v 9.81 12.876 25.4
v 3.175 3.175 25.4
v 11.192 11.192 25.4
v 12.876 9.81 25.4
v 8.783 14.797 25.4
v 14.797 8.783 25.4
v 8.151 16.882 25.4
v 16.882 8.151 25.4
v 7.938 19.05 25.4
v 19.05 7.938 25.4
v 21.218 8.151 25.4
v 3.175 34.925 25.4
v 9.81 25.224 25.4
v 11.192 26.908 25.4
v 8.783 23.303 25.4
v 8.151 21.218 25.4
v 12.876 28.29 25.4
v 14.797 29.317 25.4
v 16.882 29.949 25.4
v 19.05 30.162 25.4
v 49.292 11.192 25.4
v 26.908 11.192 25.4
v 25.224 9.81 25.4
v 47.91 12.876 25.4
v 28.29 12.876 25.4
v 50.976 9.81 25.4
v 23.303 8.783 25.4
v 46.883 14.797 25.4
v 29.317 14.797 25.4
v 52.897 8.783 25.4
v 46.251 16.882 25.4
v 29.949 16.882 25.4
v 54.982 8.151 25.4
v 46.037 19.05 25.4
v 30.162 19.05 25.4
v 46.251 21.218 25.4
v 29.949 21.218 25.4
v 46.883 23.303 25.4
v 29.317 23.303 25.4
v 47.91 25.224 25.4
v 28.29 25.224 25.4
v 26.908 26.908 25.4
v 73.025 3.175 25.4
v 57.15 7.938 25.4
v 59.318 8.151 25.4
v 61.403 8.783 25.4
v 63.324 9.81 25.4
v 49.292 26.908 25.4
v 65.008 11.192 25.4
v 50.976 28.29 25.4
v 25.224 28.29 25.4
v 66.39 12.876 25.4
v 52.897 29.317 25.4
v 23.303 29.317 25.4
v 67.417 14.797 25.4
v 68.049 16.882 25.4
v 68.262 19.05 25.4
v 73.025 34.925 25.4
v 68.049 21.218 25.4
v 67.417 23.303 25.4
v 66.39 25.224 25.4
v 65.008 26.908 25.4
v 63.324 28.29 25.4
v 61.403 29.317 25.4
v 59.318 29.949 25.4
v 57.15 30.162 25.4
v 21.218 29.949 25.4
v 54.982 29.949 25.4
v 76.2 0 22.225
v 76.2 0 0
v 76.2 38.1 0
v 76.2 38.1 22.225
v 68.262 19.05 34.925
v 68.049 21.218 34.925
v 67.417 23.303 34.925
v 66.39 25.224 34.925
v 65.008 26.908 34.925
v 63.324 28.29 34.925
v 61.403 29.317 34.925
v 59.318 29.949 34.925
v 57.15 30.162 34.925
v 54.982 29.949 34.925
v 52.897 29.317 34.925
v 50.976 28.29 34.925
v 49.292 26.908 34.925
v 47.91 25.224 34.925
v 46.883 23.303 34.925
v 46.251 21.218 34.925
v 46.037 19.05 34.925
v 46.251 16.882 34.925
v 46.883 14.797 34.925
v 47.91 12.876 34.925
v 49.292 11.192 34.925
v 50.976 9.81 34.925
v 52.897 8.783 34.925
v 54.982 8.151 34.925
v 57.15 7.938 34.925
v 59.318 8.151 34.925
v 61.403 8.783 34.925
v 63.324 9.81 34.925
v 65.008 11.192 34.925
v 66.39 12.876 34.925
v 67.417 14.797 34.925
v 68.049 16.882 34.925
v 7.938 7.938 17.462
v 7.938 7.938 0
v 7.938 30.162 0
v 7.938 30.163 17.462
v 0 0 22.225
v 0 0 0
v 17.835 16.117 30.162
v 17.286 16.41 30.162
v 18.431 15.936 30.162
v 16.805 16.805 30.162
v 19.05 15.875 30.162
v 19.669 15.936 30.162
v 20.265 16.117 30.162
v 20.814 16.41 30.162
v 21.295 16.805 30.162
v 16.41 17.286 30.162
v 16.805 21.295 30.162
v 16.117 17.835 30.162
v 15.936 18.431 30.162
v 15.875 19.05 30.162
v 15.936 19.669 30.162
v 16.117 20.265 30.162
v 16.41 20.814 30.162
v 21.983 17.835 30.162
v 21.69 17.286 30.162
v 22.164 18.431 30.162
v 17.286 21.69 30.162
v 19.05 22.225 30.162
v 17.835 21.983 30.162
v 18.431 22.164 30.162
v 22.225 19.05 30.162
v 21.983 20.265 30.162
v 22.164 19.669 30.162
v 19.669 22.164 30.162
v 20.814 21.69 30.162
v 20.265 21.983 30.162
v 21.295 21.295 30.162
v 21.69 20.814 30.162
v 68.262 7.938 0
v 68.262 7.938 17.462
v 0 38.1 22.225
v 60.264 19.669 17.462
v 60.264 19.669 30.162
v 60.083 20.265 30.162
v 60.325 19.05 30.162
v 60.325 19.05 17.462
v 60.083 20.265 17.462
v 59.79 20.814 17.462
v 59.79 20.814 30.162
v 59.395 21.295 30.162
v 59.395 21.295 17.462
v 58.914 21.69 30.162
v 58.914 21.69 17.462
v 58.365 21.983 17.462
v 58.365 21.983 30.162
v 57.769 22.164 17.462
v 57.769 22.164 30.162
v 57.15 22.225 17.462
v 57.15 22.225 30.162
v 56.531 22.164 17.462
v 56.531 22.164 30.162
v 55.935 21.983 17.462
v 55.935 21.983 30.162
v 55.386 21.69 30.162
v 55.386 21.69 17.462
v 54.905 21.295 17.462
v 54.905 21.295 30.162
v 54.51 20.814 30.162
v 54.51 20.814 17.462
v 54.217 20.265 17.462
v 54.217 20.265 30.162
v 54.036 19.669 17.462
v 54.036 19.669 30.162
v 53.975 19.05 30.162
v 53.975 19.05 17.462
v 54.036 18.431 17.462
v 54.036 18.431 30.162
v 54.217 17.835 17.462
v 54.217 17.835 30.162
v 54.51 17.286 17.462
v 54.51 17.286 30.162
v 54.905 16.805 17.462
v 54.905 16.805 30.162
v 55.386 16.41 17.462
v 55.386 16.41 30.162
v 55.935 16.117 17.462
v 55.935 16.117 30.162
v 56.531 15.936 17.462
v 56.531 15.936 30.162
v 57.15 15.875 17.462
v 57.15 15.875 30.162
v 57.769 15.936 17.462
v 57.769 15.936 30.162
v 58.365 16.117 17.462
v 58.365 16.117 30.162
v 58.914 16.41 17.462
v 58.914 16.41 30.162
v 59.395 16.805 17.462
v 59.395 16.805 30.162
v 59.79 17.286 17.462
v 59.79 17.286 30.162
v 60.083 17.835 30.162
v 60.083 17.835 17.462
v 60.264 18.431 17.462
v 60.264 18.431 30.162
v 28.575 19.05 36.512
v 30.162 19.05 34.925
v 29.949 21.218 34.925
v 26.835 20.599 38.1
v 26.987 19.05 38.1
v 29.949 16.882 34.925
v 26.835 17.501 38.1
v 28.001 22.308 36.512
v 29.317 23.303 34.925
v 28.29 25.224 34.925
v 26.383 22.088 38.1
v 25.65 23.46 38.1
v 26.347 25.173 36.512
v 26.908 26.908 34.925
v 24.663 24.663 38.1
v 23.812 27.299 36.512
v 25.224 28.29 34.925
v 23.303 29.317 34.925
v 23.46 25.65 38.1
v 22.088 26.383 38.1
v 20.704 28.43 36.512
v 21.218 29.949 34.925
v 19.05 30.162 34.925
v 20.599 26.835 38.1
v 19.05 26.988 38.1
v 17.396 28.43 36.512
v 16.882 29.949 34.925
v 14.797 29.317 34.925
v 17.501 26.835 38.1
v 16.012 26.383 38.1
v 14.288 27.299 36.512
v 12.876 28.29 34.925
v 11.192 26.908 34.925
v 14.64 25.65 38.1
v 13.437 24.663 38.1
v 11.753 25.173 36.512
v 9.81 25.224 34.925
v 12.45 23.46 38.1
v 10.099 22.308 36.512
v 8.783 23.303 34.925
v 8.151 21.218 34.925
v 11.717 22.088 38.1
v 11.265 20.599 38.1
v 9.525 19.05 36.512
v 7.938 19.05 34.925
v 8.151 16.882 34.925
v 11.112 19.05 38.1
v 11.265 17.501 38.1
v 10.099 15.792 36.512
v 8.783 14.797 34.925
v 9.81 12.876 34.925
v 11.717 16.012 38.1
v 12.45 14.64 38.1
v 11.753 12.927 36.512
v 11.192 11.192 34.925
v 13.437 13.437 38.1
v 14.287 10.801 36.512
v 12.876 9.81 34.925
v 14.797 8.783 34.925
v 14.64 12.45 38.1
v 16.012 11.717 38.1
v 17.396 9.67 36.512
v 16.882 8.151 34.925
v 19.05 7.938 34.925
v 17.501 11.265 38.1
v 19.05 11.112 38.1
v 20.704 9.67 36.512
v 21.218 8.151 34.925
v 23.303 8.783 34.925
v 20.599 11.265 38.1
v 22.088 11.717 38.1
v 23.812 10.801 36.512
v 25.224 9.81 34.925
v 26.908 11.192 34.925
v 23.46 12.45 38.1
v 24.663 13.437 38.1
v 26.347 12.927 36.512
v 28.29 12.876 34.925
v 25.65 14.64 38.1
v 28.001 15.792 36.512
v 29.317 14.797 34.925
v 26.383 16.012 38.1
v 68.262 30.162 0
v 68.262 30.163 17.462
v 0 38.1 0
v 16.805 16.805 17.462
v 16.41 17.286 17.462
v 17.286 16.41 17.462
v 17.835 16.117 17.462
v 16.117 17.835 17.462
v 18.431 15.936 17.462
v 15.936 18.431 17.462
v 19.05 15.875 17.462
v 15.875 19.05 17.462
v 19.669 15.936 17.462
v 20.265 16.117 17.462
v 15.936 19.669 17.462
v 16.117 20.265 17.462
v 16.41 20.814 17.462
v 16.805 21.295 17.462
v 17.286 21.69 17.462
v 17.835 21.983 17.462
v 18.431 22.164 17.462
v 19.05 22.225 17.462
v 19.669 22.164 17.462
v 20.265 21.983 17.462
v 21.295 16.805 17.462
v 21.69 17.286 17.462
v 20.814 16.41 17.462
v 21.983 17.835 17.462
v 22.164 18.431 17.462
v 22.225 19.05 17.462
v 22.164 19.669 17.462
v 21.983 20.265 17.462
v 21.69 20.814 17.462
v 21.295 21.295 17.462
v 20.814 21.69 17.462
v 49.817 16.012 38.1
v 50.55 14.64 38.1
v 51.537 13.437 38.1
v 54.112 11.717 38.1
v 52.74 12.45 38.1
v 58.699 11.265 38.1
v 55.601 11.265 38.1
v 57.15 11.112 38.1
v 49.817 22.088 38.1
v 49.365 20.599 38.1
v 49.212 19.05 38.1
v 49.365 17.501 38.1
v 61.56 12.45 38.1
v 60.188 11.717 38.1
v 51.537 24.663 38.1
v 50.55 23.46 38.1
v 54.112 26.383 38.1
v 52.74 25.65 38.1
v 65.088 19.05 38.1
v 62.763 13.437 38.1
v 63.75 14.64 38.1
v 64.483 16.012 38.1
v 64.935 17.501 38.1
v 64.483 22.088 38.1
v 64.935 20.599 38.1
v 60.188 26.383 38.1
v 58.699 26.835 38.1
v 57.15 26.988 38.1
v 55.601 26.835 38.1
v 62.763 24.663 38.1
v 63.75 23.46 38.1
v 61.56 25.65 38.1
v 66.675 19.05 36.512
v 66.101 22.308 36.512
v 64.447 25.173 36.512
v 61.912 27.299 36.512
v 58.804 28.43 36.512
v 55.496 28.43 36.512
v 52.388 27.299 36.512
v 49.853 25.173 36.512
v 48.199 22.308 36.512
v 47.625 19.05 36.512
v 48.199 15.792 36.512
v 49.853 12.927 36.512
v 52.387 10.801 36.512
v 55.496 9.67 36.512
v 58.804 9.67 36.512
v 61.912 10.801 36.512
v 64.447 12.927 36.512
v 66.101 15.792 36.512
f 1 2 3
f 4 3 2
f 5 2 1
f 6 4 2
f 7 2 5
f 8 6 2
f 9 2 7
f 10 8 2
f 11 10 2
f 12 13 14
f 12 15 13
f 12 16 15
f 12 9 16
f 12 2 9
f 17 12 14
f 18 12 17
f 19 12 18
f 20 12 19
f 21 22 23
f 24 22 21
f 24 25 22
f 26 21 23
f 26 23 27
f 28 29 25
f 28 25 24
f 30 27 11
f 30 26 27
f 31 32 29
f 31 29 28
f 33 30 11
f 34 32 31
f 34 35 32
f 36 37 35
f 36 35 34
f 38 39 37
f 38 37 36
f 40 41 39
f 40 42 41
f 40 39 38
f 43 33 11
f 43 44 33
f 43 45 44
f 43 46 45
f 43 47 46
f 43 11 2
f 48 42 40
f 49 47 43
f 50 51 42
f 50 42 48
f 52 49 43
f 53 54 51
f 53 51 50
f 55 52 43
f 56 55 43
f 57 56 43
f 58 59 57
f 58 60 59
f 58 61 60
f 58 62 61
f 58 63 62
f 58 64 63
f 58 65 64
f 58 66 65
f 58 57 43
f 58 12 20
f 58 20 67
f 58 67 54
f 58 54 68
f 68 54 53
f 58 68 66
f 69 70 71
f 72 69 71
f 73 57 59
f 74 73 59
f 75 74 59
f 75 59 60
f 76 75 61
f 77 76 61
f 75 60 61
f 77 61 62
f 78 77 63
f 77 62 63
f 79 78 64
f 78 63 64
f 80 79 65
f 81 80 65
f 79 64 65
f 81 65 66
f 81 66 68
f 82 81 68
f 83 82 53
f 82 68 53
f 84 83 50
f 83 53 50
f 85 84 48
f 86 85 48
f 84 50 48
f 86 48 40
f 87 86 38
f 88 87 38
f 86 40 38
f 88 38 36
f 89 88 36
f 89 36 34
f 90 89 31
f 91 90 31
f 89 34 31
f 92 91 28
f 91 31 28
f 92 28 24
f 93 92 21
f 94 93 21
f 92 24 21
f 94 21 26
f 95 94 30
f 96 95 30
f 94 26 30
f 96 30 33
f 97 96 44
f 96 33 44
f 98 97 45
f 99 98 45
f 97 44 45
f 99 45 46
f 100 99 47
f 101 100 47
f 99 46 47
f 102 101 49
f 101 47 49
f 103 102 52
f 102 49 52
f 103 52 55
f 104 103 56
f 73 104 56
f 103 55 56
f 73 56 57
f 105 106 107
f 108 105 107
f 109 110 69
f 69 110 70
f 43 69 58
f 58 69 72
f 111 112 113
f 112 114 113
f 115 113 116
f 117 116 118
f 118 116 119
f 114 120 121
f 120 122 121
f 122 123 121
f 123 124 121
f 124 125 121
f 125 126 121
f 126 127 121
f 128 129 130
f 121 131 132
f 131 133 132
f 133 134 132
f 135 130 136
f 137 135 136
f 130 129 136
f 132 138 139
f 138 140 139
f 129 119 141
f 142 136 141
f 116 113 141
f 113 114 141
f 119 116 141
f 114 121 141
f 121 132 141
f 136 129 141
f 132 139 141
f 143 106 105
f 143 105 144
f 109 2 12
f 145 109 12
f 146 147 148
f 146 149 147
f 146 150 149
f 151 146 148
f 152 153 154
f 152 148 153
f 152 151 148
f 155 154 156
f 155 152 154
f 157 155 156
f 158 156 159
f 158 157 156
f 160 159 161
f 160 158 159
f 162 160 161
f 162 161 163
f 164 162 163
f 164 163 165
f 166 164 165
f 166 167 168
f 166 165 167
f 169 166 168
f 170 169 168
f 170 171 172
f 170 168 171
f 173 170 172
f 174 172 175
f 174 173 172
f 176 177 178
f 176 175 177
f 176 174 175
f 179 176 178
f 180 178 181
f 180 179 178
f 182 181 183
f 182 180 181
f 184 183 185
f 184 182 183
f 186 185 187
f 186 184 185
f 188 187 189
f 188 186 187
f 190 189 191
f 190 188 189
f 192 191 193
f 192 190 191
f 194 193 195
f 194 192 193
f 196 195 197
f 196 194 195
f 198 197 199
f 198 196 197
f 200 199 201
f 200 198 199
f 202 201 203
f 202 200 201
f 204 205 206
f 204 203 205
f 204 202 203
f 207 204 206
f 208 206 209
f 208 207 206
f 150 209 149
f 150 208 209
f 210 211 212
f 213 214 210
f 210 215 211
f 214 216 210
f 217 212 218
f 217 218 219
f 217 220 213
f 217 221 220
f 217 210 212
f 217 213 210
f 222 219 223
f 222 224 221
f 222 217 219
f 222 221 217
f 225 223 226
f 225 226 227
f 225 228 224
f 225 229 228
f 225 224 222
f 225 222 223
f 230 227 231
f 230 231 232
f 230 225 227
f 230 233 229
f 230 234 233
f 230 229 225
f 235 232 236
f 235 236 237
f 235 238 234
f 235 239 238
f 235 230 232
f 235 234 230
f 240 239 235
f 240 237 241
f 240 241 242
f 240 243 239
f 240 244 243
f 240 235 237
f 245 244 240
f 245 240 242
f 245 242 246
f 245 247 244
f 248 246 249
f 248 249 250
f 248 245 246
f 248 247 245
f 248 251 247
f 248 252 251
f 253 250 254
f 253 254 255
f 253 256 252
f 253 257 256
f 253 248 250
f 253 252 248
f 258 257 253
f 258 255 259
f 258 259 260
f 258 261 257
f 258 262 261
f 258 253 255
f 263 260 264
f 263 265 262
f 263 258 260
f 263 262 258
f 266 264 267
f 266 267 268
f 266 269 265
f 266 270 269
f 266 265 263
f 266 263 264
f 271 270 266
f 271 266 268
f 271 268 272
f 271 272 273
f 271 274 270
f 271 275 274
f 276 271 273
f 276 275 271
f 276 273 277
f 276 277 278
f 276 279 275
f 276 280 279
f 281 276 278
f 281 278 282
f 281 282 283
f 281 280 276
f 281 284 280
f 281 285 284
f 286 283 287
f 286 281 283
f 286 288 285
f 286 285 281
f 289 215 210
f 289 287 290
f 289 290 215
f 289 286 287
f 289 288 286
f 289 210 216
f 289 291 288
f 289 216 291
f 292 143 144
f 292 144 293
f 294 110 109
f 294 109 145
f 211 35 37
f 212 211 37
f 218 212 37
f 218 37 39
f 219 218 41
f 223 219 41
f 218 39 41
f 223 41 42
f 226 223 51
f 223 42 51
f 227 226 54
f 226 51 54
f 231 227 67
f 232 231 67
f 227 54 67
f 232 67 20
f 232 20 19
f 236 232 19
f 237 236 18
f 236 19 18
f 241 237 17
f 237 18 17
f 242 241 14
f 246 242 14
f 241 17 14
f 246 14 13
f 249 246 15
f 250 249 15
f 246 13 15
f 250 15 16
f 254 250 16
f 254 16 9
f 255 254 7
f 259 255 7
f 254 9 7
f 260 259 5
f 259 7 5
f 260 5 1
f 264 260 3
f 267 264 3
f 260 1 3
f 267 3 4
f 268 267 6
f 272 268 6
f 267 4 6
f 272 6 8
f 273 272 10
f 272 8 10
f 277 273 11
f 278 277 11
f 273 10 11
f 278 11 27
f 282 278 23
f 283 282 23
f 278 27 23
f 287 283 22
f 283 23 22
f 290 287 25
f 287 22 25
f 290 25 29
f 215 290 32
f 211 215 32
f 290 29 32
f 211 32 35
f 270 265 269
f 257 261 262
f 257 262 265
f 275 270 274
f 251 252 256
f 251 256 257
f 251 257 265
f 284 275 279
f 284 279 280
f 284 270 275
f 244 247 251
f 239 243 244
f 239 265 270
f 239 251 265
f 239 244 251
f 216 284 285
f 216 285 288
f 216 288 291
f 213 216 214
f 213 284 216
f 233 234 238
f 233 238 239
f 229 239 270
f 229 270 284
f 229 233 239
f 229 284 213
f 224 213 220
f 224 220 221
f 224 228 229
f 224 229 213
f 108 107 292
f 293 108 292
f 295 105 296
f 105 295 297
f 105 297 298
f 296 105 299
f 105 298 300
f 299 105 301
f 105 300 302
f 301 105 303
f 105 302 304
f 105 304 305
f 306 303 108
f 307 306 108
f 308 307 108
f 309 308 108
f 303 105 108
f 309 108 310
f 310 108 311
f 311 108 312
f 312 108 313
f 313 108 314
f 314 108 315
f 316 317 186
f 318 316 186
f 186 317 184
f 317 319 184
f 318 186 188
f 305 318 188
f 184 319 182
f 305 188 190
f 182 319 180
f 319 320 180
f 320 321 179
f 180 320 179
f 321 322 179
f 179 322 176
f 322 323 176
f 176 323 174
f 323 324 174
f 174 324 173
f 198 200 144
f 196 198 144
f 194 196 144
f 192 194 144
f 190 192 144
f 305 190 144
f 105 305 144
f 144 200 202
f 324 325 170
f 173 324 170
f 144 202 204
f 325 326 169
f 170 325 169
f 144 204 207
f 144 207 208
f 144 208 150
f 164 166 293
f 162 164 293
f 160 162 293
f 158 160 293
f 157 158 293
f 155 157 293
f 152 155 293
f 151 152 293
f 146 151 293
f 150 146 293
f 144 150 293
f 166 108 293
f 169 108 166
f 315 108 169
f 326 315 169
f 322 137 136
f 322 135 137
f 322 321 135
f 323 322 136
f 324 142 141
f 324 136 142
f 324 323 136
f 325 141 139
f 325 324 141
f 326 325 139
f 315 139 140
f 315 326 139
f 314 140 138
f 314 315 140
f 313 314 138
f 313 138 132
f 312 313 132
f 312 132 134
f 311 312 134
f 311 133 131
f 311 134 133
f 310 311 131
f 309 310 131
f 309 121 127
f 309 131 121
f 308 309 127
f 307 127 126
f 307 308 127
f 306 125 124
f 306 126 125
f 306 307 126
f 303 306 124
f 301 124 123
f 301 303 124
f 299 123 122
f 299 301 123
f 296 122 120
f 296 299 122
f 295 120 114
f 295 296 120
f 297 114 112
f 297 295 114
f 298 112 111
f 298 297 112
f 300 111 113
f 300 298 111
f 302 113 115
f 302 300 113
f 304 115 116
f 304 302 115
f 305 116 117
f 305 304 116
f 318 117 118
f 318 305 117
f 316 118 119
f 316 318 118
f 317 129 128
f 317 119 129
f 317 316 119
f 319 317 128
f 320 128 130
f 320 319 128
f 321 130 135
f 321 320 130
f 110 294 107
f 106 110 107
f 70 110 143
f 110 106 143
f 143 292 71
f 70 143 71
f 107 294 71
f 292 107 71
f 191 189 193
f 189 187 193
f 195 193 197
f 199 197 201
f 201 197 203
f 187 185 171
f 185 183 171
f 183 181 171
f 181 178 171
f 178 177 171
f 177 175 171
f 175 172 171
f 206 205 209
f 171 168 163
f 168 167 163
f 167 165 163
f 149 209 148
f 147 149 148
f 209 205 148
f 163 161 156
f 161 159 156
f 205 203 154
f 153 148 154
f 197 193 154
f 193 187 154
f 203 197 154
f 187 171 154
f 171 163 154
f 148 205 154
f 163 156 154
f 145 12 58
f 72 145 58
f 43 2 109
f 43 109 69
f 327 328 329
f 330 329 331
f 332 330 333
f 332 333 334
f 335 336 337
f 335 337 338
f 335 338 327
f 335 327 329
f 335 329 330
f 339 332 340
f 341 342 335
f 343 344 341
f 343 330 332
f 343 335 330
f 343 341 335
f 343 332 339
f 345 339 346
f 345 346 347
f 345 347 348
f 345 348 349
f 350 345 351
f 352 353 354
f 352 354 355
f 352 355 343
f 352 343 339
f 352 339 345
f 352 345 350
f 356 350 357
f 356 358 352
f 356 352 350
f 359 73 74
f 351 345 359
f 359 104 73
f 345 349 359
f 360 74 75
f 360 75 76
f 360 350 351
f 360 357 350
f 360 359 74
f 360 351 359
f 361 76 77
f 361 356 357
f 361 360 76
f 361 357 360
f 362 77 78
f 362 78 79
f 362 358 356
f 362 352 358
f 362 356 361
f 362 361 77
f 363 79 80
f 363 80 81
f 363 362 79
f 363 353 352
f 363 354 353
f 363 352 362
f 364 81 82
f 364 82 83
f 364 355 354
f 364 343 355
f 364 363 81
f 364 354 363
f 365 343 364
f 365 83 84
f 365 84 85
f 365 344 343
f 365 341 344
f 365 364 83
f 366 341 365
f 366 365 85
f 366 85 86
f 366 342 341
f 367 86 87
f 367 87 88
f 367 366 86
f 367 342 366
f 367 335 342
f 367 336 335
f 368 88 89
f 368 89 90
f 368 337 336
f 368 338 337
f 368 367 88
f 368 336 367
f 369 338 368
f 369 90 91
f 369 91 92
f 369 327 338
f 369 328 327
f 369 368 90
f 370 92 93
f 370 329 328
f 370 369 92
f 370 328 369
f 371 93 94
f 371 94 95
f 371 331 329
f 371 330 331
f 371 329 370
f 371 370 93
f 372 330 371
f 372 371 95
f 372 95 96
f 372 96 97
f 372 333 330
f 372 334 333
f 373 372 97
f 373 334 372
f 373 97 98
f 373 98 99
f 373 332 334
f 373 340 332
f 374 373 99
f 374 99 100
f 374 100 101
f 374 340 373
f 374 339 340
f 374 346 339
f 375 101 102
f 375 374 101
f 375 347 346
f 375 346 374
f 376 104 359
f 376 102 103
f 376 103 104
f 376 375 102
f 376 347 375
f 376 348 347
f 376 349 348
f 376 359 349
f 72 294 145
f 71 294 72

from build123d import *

# Parameters (mm, degrees)
F0_W     = 76.2
F0_H     = 38.1
F1_DEPTH = 25.4
F2_R     = 11.1125
F3_DEPTH = 12.7
F4_T     = -7.9375
F5_SIZE2 = 3.175
F5_SIZE  = 3.175


with BuildPart() as f1:
    # F0 (on Top) → F1 (new body)
    with BuildSketch(Plane.XY):
        with Locations((38.1, 19.05)):
            Rectangle(F0_W, F0_H)
    extrude(amount=F1_DEPTH)

    # F2 (on face) → F3 (join)
    with BuildSketch(Plane.XY.offset(25.4)):
        with Locations((19.05, 19.05)):
            Circle(F2_R)
        with Locations((57.15, 19.05)):
            Circle(F2_R)
    extrude(amount=F3_DEPTH)

    # F4
    f4_openings = [f1.faces().sort_by_distance(p)[0] for p in [
        (38.1, 19.05, 0),
    ]]
    offset(amount=F4_T, openings=f4_openings, kind=Kind.INTERSECTION)

    # F5
    f5_edges = [f1.edges().sort_by_distance(p)[0] for p in [
        (7.9375, 19.05, 38.1),
        (46.0375, 19.05, 38.1),
        (38.1, 0, 25.4),
        (38.1, 38.1, 25.4),
        (0, 19.05, 25.4),
        (76.2, 19.05, 25.4),
    ]]
    chamfer(f5_edges, length=F5_SIZE, length2=F5_SIZE2)


solid = f1.part
